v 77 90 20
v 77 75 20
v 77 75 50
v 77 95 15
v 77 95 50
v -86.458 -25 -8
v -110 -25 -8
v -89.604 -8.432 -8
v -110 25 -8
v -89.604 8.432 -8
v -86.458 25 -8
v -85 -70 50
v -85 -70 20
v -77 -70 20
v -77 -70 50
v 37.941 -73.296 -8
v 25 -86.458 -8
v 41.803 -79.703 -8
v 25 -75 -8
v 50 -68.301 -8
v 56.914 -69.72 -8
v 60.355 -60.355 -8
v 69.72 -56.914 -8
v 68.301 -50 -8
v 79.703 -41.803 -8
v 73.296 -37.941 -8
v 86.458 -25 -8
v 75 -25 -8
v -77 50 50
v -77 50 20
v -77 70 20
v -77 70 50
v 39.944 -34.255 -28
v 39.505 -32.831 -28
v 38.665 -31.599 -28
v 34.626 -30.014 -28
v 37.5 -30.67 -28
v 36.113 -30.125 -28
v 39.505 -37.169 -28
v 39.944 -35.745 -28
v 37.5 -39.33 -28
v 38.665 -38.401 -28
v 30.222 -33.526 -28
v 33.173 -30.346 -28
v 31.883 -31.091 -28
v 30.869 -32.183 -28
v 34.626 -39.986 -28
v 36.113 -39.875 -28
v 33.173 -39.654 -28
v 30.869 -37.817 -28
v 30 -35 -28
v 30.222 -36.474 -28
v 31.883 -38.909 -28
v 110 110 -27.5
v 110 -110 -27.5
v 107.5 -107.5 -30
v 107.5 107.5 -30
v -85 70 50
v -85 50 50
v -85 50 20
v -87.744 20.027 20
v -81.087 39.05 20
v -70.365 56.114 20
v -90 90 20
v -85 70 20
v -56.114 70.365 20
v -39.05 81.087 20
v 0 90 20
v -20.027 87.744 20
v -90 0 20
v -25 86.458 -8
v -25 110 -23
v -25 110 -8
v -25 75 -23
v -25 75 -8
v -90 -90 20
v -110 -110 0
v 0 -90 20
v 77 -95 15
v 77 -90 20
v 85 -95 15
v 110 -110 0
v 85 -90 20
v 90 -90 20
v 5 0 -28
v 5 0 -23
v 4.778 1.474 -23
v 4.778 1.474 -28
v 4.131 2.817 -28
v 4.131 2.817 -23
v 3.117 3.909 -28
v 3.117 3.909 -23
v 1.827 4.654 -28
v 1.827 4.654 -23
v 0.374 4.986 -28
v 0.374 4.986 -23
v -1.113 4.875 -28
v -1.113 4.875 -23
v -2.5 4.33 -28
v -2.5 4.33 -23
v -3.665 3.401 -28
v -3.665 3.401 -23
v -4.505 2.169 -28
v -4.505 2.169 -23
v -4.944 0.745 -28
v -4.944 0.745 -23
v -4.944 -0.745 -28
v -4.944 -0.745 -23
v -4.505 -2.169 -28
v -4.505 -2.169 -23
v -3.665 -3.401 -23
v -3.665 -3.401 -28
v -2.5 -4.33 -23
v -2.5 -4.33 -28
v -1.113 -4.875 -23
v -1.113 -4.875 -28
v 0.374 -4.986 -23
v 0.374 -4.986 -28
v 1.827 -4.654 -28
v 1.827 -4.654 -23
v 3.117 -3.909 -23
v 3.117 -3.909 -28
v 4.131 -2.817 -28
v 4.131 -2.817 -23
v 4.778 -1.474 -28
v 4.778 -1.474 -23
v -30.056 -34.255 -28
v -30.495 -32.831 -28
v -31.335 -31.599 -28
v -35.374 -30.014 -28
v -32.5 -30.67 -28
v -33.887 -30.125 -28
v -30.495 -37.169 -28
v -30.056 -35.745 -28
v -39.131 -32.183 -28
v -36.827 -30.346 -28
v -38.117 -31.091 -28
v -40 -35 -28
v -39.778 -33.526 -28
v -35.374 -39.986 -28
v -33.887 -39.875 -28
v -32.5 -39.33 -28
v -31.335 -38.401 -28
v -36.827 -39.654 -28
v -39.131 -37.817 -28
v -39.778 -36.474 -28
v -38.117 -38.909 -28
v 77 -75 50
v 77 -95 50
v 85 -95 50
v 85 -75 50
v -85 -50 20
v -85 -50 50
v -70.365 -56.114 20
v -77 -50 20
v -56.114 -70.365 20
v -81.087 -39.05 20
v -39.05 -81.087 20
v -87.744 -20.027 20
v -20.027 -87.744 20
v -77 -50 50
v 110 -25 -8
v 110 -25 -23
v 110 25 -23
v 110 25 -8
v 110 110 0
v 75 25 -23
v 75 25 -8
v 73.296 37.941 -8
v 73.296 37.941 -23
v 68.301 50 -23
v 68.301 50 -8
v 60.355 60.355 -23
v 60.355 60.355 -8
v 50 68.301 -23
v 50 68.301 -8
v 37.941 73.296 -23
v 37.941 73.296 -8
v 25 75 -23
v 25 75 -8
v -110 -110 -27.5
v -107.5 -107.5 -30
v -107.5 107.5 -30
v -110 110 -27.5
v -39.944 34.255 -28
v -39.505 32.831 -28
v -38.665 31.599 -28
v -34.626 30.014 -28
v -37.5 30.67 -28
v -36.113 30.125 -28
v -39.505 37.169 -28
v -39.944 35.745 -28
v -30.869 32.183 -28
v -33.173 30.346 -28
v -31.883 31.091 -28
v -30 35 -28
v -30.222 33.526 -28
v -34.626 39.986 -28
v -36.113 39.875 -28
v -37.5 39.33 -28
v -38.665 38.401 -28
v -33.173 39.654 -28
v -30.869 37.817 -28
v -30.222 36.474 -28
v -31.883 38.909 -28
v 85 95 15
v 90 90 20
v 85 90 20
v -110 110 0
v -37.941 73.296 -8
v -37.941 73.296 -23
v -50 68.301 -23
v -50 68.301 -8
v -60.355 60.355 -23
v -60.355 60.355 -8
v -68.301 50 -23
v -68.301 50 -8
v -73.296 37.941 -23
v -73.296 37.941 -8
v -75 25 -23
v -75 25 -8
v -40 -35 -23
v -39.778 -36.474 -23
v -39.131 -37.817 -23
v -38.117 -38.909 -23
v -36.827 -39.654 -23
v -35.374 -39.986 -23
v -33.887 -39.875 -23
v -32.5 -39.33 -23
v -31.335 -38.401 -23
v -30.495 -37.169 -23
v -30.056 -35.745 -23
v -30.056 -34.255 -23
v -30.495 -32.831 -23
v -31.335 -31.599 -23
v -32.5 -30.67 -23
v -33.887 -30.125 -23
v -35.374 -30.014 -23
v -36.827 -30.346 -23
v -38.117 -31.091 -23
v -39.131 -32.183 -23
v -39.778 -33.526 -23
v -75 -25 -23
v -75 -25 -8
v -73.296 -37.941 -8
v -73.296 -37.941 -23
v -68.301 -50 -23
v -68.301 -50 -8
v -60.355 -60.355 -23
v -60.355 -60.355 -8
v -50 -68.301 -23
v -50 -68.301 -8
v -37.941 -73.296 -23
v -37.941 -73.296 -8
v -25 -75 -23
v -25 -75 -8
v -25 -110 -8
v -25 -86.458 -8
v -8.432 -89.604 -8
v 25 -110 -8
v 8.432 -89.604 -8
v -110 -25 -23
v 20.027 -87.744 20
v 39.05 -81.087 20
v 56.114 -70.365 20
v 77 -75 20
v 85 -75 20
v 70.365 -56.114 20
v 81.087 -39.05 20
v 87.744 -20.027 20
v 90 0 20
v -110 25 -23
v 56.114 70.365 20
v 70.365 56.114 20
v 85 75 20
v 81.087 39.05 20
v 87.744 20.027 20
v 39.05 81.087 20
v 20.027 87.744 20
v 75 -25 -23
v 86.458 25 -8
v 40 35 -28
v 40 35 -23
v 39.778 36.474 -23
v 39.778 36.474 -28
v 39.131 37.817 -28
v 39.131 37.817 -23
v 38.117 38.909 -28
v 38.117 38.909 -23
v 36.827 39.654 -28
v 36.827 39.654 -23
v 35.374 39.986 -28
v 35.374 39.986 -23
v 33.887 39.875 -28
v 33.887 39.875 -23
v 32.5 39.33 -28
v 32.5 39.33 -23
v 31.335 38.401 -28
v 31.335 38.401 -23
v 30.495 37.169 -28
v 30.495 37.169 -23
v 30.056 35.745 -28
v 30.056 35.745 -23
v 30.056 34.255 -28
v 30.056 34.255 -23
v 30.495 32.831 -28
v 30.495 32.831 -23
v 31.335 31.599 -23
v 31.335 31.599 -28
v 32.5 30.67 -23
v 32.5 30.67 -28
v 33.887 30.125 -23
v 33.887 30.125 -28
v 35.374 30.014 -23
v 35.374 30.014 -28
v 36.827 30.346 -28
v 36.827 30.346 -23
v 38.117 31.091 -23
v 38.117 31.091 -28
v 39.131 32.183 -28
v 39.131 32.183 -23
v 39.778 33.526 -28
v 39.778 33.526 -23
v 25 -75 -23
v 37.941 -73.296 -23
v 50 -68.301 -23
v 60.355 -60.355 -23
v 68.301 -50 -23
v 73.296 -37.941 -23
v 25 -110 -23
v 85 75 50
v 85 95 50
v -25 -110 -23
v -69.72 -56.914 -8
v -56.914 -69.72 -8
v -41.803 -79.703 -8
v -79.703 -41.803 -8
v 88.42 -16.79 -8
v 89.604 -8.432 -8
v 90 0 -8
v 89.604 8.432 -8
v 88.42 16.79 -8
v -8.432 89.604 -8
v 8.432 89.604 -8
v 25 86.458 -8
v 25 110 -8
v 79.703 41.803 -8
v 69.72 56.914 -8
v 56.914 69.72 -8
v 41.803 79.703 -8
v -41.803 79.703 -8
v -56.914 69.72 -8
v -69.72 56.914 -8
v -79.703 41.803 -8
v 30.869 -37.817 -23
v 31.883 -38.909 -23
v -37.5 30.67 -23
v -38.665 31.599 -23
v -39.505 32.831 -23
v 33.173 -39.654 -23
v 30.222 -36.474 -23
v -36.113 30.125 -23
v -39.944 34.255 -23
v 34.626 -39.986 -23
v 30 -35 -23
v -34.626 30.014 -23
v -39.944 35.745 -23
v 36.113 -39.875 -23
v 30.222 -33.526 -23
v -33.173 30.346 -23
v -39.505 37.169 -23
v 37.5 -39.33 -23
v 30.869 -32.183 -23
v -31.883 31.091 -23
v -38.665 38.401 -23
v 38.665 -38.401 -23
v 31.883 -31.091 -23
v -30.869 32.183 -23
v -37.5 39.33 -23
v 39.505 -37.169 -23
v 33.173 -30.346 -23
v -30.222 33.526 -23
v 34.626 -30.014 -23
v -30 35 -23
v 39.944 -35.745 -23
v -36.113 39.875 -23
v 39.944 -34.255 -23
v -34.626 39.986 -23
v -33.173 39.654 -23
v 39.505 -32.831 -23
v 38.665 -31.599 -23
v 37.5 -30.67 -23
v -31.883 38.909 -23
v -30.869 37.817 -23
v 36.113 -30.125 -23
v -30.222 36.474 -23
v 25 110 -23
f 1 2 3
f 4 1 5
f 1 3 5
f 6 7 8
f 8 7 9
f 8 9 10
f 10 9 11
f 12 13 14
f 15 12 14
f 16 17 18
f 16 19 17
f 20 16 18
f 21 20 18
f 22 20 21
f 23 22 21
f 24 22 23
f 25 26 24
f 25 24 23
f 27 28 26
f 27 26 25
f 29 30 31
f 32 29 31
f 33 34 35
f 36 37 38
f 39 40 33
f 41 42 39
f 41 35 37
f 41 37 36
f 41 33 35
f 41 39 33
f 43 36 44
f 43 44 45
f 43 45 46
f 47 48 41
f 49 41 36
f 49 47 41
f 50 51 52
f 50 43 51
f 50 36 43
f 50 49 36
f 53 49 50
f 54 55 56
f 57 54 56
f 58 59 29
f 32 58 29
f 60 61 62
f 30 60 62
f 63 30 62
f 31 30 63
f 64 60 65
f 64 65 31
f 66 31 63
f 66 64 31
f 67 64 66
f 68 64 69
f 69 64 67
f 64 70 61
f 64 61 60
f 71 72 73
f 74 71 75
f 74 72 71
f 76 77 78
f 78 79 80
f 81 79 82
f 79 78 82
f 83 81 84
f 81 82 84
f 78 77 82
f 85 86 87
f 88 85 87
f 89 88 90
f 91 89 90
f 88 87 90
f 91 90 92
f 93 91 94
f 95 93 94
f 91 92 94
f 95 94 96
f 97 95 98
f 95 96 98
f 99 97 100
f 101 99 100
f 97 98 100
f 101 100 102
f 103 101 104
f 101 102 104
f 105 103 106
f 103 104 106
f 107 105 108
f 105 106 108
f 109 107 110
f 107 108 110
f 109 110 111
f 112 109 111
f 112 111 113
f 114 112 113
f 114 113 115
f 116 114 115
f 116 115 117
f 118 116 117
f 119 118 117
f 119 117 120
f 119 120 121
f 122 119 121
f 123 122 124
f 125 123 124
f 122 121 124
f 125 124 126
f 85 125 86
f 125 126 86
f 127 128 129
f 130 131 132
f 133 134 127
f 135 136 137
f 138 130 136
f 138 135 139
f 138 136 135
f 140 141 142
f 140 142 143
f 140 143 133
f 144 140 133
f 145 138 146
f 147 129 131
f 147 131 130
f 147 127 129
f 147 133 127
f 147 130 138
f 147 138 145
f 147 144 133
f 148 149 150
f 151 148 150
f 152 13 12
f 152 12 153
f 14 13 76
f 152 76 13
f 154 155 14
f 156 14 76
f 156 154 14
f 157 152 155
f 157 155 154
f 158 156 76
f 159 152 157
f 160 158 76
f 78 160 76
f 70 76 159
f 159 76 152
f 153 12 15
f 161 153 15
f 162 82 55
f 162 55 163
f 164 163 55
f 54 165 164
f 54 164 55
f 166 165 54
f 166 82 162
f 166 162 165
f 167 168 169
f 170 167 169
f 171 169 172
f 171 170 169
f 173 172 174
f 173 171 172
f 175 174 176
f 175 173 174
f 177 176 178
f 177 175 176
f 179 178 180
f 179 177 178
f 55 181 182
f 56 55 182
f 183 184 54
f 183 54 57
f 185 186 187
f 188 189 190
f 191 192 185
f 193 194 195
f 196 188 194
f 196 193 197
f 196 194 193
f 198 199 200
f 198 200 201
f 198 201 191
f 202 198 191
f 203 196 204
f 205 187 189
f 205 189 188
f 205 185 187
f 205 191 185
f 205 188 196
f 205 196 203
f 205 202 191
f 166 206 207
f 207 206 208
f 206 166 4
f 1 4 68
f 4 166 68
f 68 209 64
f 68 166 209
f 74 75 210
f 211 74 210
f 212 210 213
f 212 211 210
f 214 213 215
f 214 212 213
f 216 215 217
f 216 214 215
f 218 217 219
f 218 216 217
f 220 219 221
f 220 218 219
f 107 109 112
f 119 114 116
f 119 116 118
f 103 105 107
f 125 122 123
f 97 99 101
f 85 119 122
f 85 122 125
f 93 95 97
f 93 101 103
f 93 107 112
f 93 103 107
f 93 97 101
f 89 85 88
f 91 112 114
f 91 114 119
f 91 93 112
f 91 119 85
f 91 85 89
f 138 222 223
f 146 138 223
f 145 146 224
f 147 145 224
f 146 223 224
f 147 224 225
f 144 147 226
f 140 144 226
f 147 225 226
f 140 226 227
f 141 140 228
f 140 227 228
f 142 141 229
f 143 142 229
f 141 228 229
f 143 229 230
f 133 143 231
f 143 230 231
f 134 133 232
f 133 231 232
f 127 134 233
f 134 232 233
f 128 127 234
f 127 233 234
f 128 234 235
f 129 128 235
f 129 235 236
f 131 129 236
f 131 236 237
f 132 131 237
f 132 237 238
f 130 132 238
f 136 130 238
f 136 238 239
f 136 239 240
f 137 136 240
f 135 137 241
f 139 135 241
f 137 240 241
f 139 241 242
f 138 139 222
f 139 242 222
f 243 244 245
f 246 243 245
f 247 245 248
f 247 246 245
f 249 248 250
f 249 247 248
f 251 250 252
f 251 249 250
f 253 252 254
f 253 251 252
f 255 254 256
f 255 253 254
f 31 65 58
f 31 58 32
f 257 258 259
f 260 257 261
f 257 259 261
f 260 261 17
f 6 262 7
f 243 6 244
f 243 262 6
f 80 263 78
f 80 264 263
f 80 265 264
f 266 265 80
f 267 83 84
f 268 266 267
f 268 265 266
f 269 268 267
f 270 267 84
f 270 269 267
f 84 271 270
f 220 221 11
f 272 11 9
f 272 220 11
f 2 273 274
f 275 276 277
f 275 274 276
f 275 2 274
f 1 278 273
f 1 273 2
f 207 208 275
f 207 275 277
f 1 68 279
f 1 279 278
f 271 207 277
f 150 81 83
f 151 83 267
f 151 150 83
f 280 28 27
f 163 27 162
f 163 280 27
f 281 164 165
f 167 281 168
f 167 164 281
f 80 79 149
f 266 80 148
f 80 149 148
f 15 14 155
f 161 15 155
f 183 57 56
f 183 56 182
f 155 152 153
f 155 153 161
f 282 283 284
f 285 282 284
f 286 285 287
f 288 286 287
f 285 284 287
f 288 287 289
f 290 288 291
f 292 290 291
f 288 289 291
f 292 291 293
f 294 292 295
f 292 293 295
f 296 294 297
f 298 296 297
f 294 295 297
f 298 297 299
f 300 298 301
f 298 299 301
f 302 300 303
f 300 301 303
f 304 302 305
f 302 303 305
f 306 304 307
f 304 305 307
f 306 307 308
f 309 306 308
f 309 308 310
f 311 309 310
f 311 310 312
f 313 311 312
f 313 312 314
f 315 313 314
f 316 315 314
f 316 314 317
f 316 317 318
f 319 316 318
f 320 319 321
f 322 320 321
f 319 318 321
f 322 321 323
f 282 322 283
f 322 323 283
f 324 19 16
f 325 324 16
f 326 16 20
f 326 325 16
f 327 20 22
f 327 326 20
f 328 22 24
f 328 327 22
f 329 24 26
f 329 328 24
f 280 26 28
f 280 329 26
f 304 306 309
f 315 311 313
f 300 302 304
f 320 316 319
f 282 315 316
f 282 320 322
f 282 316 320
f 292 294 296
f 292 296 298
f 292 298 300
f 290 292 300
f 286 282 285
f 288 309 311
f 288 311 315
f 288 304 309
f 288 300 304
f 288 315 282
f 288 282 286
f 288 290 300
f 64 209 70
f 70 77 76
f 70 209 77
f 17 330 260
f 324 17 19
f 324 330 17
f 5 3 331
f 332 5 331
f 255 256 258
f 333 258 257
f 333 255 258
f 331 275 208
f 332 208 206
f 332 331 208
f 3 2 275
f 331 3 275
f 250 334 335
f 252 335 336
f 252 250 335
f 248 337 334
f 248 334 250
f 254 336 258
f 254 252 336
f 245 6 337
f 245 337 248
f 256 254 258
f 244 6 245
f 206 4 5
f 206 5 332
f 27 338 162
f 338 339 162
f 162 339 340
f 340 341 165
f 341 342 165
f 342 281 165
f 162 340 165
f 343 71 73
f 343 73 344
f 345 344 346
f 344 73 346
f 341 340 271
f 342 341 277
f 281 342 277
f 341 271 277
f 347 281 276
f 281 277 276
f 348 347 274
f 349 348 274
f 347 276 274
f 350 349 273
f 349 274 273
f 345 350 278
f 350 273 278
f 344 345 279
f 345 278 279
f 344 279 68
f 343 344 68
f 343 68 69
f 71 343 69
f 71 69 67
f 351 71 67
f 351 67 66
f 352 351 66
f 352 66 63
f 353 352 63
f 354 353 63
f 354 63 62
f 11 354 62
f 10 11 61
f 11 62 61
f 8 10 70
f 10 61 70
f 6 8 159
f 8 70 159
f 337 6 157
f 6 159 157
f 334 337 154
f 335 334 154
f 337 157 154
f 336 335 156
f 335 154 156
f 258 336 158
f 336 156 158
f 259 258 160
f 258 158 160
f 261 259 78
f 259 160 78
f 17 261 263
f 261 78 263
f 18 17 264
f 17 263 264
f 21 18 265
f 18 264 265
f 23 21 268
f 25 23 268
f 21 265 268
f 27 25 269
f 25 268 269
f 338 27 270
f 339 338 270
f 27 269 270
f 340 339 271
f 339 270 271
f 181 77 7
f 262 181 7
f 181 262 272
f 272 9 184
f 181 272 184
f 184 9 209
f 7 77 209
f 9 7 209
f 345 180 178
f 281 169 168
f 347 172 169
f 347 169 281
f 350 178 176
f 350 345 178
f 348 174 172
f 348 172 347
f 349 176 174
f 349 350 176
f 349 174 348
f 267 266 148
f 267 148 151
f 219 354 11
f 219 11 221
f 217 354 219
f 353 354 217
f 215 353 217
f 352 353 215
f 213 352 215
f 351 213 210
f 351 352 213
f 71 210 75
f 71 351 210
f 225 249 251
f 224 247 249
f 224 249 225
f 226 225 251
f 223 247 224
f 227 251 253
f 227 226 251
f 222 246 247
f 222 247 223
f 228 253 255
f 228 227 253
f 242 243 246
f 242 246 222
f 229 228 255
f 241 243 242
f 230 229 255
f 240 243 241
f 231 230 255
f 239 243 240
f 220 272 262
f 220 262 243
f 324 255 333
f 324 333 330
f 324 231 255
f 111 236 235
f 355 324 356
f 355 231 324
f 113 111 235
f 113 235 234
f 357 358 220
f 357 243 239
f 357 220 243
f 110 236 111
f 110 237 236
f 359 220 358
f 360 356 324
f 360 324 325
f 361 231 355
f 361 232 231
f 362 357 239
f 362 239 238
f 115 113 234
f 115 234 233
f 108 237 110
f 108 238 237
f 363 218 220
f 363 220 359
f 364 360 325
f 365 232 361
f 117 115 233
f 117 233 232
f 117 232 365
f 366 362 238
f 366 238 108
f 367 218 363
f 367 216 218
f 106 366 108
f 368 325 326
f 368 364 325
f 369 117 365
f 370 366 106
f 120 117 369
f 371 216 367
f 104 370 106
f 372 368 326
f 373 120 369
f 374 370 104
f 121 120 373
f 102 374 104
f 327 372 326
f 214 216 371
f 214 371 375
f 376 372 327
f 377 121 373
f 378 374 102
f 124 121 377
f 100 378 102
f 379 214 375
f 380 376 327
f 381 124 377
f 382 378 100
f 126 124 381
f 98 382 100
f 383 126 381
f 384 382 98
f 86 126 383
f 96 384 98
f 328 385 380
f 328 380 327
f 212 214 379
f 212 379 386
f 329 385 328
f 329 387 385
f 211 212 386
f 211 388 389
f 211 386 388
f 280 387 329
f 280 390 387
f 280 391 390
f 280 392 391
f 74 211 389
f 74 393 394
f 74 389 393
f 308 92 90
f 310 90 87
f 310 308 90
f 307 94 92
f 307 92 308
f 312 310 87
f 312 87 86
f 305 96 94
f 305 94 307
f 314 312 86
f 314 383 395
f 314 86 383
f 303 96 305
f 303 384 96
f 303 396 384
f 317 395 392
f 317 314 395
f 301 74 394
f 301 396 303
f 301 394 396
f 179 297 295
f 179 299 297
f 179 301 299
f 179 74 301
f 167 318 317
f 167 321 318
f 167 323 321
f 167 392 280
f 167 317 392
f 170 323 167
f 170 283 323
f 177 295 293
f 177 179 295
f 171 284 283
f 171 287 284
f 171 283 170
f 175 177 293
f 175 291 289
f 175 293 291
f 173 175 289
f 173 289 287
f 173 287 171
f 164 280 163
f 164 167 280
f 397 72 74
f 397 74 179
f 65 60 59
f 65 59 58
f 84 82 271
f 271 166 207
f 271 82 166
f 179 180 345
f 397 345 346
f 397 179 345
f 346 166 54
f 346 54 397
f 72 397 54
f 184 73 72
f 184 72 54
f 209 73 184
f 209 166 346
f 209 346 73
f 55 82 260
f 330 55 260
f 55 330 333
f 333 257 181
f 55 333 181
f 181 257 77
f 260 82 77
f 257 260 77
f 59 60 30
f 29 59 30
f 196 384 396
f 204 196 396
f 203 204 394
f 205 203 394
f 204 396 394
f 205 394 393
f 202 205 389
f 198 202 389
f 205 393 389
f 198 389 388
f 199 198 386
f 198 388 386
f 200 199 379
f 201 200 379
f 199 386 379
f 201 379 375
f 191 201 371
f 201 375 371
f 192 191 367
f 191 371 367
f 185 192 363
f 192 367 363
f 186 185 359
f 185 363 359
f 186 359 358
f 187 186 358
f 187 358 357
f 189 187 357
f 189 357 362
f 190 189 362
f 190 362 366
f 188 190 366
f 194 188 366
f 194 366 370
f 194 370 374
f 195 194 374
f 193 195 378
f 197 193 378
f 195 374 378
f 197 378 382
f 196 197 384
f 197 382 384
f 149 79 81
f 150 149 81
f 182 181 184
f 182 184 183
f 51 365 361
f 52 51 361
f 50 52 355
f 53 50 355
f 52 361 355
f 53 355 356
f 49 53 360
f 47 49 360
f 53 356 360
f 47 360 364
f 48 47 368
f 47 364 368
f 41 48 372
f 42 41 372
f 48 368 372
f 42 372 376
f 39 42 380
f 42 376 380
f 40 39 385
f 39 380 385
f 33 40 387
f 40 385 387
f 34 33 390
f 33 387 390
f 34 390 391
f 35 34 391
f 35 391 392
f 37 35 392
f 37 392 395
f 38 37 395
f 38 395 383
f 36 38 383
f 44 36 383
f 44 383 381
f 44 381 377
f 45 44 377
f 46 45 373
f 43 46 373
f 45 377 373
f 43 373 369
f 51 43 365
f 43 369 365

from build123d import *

# Parameters (mm, degrees)
SKETCH_1_W                  = 220
SKETCH_1_H                  = 220
EXTRUDE_1_DEPTH             = 20
EXTRUDE_1_TAPER             = 45
SKETCH_2_W                  = 8
SKETCH_2_H                  = 20
EXTRUDE_2_DEPTH             = 30
EXTRUDE_2_DIRECTION_2_REACH = 158.844
SKETCH_4_W                  = 220
SKETCH_4_H                  = 220
EXTRUDE_3_DEPTH             = 30
CUT_EXTRUDE_1_DEPTH         = 15
SKETCH_7_R                  = 90
CUT_EXTRUDE_2_DEPTH         = 28
SKETCH_9_R                  = 5
CUT_EXTRUDE_3_DEPTH         = 5
CUT_EXTRUDE_4_DEPTH         = 251.99800796
PATTERN_CIRCULAR_2_COUNT    = 4


with BuildPart() as part:
    # 스케치1 → 보스-돌출1 (new body)
    with BuildSketch(Plane.XY):
        Rectangle(SKETCH_1_W, SKETCH_1_H)
    extrude(amount=EXTRUDE_1_DEPTH, taper=EXTRUDE_1_TAPER)

    # 스케치2 → 보스-돌출2 (add)
    with BuildSketch(Plane.XY.offset(20)):
        with Locations((-81, 60)):
            Rectangle(SKETCH_2_W, SKETCH_2_H)
        with Locations((-81, -60)):
            Rectangle(SKETCH_2_W, SKETCH_2_H)
        with Locations((81, 85)):
            Rectangle(SKETCH_2_W, SKETCH_2_H)
        with Locations((81, -85)):
            Rectangle(SKETCH_2_W, SKETCH_2_H)
    extrude(amount=EXTRUDE_2_DEPTH)

    # 보스-돌출2 direction 2: up to this face of the body (flat: up to its plane)
    extrude_2_direction_2_end = Plane(part.part.faces().sort_by_distance((0, 0, 0))[0])
    # 스케치2 → 보스-돌출2 direction 2 (add, up to the picked face)
    with BuildSketch(Plane.XY.offset(20), mode=Mode.PRIVATE) as extrude_2_direction_2_sk1:
        with Locations((-81, 60)):
            Rectangle(SKETCH_2_W, SKETCH_2_H)
    extrude_2_direction_2_tool1 = split(extrude(extrude_2_direction_2_sk1.sketch, amount=-EXTRUDE_2_DIRECTION_2_REACH, mode=Mode.PRIVATE), bisect_by=extrude_2_direction_2_end, keep=Keep.BOTH, mode=Mode.PRIVATE)
    # 스케치2 → 보스-돌출2 direction 2 (add, up to the picked face)
    with BuildSketch(Plane.XY.offset(20), mode=Mode.PRIVATE) as extrude_2_direction_2_sk2:
        with Locations((-81, -60)):
            Rectangle(SKETCH_2_W, SKETCH_2_H)
    extrude_2_direction_2_tool2 = split(extrude(extrude_2_direction_2_sk2.sketch, amount=-EXTRUDE_2_DIRECTION_2_REACH, mode=Mode.PRIVATE), bisect_by=extrude_2_direction_2_end, keep=Keep.BOTH, mode=Mode.PRIVATE)
    # 스케치2 → 보스-돌출2 direction 2 (add, up to the picked face)
    with BuildSketch(Plane.XY.offset(20), mode=Mode.PRIVATE) as extrude_2_direction_2_sk3:
        with Locations((81, 85)):
            Rectangle(SKETCH_2_W, SKETCH_2_H)
    extrude_2_direction_2_tool3 = split(extrude(extrude_2_direction_2_sk3.sketch, amount=-EXTRUDE_2_DIRECTION_2_REACH, mode=Mode.PRIVATE), bisect_by=extrude_2_direction_2_end, keep=Keep.BOTH, mode=Mode.PRIVATE)
    # 스케치2 → 보스-돌출2 direction 2 (add, up to the picked face)
    with BuildSketch(Plane.XY.offset(20), mode=Mode.PRIVATE) as extrude_2_direction_2_sk4:
        with Locations((81, -85)):
            Rectangle(SKETCH_2_W, SKETCH_2_H)
    extrude_2_direction_2_tool4 = split(extrude(extrude_2_direction_2_sk4.sketch, amount=-EXTRUDE_2_DIRECTION_2_REACH, mode=Mode.PRIVATE), bisect_by=extrude_2_direction_2_end, keep=Keep.BOTH, mode=Mode.PRIVATE)
    add(extrude_2_direction_2_tool1.solids().sort_by(Axis((-81, 60, 20), (0, 0, -1)))[0])
    add(extrude_2_direction_2_tool2.solids().sort_by(Axis((-81, -60, 20), (0, 0, -1)))[0])
    add(extrude_2_direction_2_tool3.solids().sort_by(Axis((81, 85, 20), (0, 0, -1)))[0])
    add(extrude_2_direction_2_tool4.solids().sort_by(Axis((81, -85, 20), (0, 0, -1)))[0])

    # 스케치4 → 보스-돌출3 (add)
    with BuildSketch(Plane(origin=(0, 0, 0), x_dir=(-1, 0, 0), z_dir=(0, 0, -1))):
        Rectangle(SKETCH_4_W, SKETCH_4_H)
    extrude(amount=EXTRUDE_3_DEPTH)

    # 스케치6 → 컷-돌출1 (cut)
    with BuildSketch(Plane(origin=(0, 0, -23), x_dir=(-1, 0, 0), z_dir=(0, 0, -1))):
        with BuildLine():
            Line((-110, 25), (-75, 25))
            ThreePointArc((-75, 25), (-60.355339059, 60.355339059), (-25, 75))
            Line((-25, 75), (-25, 110))
            Line((-25, 110), (25, 110))
            Line((25, 110), (25, 75))
            ThreePointArc((25, 75), (60.355339059, 60.355339059), (75, 25))
            Line((75, 25), (110, 25))
            Line((110, 25), (110, -25))
            Line((110, -25), (75, -25))
            ThreePointArc((75, -25), (60.355339059, -60.355339059), (25, -75))
            Line((25, -75), (25, -110))
            Line((25, -110), (-25, -110))
            Line((-25, -110), (-25, -75))
            ThreePointArc((-25, -75), (-60.355339059, -60.355339059), (-75, -25))
            Line((-75, -25), (-110, -25))
            Line((-110, -25), (-110, 25))
        make_face()
    extrude(amount=-CUT_EXTRUDE_1_DEPTH, mode=Mode.SUBTRACT)

    # 스케치7 → 컷-돌출2 (cut)
    with BuildSketch(Plane.XY.offset(20)):
        Circle(SKETCH_7_R)
    extrude(amount=-CUT_EXTRUDE_2_DEPTH, mode=Mode.SUBTRACT)

    # 스케치9 → 컷-돌출3 (cut)
    with BuildSketch(Plane.XY.offset(-23)):
        with Locations((-35, 35)):
            Circle(SKETCH_9_R)
        Circle(SKETCH_9_R)
        with Locations((35, 35)):
            Circle(SKETCH_9_R)
        with Locations(Location((35, -35, 0), (0, 0, 180))):
            Circle(SKETCH_9_R)
        with Locations(Location((-35, -35, 0), (0, 0, 180))):
            Circle(SKETCH_9_R)
    extrude(amount=-CUT_EXTRUDE_3_DEPTH, mode=Mode.SUBTRACT)

    # 스케치10 → 컷-돌출4 (cut, through all)
    with BuildSketch(Plane(origin=(0, 110, 0), x_dir=(1, 0, 0), z_dir=(0, 1, 0))):
        Polygon((-110, 30), (-110, 27.5), (-107.5, 30), align=None)
    cut_extrude_4 = extrude(amount=-CUT_EXTRUDE_4_DEPTH, mode=Mode.SUBTRACT)

    # 원형 패턴2: 컷-돌출4 ×4 about axis
    pattern_circular_2_axis = Axis((0, 0, 0), (0, 0, 1))
    for i in range(1, PATTERN_CIRCULAR_2_COUNT):
        add(cut_extrude_4.rotate(pattern_circular_2_axis, i * 360 / PATTERN_CIRCULAR_2_COUNT), mode=Mode.SUBTRACT)


solid = part.part
